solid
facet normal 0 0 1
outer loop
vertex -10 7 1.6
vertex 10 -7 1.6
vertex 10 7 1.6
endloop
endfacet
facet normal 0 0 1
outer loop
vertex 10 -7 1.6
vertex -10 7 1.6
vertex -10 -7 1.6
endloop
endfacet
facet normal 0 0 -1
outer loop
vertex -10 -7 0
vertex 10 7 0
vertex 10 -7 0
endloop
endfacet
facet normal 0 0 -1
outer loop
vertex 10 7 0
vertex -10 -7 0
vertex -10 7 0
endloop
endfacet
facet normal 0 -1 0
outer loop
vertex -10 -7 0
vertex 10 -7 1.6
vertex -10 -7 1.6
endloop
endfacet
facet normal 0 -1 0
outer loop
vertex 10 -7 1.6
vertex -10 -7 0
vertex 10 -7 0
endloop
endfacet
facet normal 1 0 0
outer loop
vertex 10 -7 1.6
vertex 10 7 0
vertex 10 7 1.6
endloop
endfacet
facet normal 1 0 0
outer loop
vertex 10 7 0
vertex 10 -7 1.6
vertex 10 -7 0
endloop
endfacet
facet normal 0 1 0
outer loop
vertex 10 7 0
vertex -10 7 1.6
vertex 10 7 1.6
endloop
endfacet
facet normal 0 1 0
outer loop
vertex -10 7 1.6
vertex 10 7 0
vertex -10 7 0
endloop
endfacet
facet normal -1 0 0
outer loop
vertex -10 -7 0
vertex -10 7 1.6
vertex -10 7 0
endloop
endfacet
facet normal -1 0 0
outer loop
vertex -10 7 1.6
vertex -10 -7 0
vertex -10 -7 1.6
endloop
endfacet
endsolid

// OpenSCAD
$fn = 64;

board_x = 20.0;
board_y = 14.0;
board_z = 1.6;

color([0.05, 0.45, 0.12])
translate([-board_x/2, -board_y/2, 0])
cube([board_x, board_y, board_z], center=false);
